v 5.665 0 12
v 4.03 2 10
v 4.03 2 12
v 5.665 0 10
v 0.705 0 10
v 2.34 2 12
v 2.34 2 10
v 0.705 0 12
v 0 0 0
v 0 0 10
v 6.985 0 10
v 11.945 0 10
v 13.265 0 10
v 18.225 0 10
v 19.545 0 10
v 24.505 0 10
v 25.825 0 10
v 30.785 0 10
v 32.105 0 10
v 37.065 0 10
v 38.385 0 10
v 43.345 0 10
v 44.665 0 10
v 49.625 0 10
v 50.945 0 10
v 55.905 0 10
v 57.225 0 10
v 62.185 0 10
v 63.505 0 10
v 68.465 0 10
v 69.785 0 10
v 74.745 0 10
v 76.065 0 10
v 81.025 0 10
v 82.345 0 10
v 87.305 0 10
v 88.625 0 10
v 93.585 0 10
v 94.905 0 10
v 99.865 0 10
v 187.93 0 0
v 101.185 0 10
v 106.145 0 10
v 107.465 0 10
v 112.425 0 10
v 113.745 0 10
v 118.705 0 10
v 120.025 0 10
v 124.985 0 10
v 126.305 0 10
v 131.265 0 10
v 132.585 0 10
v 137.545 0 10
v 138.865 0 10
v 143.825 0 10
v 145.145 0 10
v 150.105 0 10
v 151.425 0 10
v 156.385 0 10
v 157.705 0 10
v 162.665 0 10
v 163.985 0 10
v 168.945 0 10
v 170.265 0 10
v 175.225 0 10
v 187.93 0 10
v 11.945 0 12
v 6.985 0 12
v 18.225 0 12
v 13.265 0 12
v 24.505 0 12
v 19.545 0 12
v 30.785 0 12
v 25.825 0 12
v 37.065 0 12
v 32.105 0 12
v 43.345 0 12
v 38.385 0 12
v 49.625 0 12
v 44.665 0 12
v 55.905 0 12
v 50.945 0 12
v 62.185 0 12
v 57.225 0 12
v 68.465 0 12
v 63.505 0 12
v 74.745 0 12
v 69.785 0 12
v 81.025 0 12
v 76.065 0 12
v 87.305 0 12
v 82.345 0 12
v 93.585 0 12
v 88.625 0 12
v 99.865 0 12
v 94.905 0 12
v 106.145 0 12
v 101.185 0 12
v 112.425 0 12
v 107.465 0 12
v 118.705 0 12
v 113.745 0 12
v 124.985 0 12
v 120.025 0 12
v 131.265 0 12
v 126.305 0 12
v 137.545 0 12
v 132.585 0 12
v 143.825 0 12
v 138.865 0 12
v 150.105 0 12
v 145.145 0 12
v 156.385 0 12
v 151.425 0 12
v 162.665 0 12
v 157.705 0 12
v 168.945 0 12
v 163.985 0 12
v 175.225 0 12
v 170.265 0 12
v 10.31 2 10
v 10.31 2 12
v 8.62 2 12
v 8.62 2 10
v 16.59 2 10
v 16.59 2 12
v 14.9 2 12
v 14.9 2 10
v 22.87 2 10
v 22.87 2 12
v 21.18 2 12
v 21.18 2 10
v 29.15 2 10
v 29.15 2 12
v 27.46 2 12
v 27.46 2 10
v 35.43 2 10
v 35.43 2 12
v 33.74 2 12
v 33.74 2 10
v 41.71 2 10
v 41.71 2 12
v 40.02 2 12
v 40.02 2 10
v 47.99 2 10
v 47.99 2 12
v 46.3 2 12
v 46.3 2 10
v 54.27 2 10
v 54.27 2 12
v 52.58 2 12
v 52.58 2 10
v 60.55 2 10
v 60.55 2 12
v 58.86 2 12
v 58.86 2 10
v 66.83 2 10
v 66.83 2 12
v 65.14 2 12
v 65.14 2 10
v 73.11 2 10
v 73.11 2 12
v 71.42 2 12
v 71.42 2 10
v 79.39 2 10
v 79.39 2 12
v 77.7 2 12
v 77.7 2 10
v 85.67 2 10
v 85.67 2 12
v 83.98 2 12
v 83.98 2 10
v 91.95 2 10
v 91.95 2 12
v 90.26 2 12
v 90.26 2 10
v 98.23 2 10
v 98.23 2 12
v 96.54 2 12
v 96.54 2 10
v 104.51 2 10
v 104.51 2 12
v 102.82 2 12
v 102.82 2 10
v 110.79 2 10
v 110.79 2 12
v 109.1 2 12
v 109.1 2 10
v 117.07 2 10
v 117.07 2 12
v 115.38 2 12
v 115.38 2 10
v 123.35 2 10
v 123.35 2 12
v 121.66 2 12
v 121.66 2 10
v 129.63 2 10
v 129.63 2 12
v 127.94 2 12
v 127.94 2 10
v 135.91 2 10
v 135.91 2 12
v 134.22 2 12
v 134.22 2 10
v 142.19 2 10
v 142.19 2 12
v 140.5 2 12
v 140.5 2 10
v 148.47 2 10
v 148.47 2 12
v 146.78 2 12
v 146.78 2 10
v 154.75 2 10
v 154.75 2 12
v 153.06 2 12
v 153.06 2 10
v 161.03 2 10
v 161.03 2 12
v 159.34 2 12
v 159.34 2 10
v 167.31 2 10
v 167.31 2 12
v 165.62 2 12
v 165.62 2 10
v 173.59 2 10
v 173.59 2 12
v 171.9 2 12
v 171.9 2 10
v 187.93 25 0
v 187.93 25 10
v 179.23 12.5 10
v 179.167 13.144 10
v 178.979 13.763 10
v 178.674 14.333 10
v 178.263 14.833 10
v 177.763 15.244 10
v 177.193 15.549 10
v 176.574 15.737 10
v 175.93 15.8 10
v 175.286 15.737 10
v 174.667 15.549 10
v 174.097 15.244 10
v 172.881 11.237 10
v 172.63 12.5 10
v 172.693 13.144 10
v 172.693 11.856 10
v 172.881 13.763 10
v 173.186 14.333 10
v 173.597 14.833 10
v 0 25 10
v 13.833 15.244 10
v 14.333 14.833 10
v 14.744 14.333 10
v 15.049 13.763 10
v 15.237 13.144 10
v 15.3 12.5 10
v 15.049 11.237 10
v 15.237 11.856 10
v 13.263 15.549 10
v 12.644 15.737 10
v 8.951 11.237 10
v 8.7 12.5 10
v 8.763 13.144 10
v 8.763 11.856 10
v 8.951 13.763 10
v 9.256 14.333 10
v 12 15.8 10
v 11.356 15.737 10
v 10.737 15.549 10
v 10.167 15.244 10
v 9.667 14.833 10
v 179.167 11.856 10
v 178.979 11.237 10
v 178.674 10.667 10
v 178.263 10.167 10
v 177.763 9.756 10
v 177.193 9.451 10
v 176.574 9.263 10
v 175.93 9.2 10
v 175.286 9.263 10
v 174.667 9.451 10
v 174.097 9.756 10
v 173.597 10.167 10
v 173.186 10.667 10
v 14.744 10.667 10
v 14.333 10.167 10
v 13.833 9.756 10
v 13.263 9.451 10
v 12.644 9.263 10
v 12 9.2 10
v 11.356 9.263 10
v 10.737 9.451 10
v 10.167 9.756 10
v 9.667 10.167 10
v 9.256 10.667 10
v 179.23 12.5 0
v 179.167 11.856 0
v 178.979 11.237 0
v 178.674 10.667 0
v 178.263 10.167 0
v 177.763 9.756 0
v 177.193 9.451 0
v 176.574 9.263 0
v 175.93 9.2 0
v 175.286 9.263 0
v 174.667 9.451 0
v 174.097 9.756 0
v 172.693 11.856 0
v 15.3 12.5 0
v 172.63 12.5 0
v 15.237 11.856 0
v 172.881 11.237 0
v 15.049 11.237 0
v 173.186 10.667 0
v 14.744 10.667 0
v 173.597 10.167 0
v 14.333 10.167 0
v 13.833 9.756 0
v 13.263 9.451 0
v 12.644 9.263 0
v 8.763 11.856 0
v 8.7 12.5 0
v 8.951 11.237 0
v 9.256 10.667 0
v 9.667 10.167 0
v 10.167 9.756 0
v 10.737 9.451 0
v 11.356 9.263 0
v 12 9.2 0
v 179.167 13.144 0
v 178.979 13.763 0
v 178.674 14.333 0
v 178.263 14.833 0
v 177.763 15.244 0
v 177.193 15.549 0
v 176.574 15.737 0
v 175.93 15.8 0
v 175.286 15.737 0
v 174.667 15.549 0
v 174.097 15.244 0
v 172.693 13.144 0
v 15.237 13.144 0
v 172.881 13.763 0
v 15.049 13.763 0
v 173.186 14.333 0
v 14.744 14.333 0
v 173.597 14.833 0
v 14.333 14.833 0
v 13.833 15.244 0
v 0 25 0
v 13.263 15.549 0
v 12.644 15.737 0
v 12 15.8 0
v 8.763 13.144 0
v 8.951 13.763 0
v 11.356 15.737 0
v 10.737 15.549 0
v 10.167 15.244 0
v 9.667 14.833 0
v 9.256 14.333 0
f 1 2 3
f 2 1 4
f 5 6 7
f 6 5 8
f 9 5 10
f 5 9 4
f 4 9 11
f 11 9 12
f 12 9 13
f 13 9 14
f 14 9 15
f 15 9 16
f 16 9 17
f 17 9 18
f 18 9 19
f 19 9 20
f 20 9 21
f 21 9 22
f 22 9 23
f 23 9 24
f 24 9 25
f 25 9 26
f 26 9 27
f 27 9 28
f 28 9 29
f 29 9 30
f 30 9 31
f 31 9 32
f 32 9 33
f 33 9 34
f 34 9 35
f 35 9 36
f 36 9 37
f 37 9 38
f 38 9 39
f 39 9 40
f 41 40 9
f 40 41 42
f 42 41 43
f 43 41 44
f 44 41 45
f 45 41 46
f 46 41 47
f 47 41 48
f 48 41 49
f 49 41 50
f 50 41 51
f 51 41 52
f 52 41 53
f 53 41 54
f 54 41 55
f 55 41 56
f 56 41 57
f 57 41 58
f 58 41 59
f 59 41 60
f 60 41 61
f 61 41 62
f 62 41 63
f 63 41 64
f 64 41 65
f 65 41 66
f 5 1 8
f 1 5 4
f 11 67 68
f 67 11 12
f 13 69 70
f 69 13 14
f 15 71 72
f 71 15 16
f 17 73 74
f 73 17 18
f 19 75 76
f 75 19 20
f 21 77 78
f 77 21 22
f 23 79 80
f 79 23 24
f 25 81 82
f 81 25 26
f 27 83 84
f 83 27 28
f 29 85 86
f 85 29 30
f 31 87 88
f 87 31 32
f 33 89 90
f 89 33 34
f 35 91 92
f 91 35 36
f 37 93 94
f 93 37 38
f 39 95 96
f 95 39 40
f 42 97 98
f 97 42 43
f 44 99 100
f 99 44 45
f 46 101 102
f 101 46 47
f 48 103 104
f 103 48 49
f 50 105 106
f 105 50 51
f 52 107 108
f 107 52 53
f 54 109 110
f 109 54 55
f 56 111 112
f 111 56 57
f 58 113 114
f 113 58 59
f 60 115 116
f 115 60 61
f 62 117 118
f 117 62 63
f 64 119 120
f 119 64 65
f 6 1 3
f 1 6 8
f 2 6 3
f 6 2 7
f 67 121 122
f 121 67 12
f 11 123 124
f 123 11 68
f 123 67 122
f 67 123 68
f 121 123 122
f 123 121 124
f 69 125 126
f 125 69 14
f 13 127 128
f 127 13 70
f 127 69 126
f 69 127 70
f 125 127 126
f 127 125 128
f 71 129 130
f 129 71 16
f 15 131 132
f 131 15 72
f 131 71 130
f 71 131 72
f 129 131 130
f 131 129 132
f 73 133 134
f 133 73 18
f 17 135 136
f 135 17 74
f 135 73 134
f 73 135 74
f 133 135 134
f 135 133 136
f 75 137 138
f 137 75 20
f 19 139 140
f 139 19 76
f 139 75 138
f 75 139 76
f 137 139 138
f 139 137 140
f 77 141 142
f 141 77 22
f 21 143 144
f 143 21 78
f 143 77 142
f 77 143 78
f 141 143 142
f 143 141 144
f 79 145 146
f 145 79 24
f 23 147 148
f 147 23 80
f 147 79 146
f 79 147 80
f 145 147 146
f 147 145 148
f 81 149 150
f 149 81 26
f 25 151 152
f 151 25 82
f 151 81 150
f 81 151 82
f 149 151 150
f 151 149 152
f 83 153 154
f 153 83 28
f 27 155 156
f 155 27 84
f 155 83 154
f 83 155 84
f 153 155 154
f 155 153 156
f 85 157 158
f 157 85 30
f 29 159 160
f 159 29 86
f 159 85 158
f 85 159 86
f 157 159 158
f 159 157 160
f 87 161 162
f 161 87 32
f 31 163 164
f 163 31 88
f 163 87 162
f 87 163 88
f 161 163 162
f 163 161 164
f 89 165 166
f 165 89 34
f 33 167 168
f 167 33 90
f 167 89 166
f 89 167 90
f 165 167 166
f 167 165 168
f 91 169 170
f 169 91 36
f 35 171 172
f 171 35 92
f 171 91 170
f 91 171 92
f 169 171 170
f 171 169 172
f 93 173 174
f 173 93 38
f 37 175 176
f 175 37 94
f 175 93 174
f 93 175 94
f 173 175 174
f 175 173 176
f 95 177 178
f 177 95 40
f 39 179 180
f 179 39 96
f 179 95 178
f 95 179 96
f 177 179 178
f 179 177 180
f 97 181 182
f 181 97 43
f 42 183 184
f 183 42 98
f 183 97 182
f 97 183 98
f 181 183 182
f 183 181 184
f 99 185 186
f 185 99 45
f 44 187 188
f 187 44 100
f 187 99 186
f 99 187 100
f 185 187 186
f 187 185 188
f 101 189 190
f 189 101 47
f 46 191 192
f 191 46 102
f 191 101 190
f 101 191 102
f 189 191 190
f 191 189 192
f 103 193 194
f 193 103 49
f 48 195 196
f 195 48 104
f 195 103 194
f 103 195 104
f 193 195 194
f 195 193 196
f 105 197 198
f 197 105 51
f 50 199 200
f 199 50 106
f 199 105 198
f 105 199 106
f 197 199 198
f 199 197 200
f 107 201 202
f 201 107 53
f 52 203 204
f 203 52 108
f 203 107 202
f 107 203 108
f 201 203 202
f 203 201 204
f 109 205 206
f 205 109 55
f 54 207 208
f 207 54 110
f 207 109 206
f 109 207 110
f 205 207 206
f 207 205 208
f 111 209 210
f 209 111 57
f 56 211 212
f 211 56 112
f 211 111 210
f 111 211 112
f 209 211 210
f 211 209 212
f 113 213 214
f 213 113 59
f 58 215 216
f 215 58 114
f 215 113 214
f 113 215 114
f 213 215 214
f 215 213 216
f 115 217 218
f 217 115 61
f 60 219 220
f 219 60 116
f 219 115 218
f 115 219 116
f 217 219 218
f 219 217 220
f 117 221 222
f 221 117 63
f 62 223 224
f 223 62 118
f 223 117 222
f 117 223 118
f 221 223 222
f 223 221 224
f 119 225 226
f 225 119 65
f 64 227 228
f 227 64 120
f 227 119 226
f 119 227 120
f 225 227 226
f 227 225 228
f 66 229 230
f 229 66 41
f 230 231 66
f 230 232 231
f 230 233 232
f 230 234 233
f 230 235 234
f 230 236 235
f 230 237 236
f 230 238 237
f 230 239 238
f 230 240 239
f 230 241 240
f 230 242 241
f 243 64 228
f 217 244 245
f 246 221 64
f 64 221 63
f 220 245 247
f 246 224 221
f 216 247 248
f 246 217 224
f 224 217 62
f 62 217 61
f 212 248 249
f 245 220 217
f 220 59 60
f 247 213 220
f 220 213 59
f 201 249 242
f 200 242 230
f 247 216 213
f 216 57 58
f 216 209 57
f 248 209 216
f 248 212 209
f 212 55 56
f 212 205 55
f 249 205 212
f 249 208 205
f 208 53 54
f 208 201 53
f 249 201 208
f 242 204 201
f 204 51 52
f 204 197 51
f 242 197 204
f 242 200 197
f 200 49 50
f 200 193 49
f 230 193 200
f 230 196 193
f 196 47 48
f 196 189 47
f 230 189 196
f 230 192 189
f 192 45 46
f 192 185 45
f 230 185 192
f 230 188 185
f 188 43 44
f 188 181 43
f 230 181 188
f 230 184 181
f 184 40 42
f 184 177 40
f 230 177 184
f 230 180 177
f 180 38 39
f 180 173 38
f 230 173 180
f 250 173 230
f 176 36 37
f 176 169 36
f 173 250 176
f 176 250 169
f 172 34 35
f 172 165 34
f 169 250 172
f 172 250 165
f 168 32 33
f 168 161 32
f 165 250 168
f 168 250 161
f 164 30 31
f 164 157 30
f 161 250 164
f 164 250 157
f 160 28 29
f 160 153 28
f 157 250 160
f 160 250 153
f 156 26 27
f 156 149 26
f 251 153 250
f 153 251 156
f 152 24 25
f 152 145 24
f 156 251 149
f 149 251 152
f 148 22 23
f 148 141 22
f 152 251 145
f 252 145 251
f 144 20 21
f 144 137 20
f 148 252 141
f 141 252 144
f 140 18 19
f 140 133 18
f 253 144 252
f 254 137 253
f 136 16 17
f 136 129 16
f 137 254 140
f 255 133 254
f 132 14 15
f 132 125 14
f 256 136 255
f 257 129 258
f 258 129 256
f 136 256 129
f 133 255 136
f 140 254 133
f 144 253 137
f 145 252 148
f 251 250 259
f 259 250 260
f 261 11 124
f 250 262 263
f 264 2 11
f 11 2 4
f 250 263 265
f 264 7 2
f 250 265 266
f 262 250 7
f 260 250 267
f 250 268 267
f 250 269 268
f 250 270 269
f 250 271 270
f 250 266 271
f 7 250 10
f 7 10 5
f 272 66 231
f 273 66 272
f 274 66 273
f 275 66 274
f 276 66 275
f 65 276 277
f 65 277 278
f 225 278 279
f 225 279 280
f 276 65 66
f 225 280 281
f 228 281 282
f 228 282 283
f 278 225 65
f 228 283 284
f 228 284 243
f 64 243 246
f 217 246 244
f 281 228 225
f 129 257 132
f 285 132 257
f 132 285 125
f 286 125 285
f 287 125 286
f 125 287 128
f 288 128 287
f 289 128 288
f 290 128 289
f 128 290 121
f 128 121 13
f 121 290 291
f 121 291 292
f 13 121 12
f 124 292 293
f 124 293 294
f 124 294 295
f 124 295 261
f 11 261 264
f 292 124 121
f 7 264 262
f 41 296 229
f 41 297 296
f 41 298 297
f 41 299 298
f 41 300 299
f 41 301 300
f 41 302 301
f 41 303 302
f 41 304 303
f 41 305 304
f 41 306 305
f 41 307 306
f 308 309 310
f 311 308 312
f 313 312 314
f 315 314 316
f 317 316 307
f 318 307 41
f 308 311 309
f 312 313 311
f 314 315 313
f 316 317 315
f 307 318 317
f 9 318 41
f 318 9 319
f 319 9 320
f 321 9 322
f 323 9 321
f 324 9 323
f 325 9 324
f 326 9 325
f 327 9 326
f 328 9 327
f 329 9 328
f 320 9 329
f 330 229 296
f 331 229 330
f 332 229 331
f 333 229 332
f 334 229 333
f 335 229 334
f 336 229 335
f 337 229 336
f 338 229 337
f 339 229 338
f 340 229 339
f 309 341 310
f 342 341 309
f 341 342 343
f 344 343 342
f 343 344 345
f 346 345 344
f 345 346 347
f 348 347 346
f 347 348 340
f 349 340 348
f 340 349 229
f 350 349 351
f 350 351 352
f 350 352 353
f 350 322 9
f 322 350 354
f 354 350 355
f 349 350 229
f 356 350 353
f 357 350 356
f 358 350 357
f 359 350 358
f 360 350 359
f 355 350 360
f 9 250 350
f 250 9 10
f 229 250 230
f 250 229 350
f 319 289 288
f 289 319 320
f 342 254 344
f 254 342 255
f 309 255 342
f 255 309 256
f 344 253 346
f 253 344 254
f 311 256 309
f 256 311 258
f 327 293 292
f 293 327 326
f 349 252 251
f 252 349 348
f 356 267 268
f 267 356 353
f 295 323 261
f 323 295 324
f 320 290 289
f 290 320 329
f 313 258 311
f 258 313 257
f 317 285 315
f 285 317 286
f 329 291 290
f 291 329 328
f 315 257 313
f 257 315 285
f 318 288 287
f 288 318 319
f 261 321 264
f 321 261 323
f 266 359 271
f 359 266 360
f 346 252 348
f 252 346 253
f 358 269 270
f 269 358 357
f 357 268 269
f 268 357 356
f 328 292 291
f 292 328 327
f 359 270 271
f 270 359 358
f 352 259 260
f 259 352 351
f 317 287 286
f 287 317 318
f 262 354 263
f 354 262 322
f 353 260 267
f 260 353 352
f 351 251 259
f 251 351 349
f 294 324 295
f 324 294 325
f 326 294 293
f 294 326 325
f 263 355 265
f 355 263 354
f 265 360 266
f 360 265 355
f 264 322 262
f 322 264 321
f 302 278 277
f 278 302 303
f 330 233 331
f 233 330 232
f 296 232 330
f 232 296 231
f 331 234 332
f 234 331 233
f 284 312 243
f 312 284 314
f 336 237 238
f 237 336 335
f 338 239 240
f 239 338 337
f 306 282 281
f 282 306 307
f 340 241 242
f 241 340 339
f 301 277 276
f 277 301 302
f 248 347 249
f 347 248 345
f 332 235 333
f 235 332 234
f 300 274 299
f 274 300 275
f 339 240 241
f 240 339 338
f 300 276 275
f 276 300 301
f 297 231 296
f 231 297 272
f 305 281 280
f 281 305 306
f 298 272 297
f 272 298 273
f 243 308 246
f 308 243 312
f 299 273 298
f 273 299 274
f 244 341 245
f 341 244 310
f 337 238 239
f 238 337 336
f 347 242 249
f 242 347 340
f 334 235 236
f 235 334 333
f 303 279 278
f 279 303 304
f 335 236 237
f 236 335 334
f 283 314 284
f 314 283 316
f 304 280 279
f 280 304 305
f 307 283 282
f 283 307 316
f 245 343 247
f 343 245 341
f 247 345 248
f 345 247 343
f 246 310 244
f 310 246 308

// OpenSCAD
$fn = 32;

// ----------------------------------------------------------------------
// Gear rack: m=2 z=28, 187.93 x 25 x 12 mm
// ----------------------------------------------------------------------

// --- parameters (mm) ---
length = 187.93;          // rack length, X
width = 25;               // rack width, Y
height = 12;              // overall height, Z
module_m = 2;             // module
back_t = 10;              // tooth root line height
pitch = 6.28;             // circular pitch
tip_w = 1.69;             // tooth thickness at the tip
root_w = 4.96;            // tooth thickness at the root line
hole_d = 6.6;             // mounting hole
sink = 0.6;               // tooth root overlap into the body

tooth_span = 175.93;

module tooth(x0) {
  /* 20 deg flank profile, sunk into the body for a positive overlap */
  translate([x0, 0, back_t - sink])
    linear_extrude(height = height - back_t + sink)
      polygon(points = [[-root_w / 2, 0], [root_w / 2, 0],
                        [tip_w / 2, height - back_t],
                        [-tip_w / 2, height - back_t]]);
}

difference() {
  union() {
    cube([length, width, back_t]);
    for (i = [0 : 28 - 1])
      tooth((i + 0.5) * pitch + (tooth_span - 28 * pitch) / 2);
  }
  translate([12, 12.5, -1]) cylinder(h = back_t + 2, d = hole_d);
  translate([175.93, 12.5, -1]) cylinder(h = back_t + 2, d = hole_d);
}
